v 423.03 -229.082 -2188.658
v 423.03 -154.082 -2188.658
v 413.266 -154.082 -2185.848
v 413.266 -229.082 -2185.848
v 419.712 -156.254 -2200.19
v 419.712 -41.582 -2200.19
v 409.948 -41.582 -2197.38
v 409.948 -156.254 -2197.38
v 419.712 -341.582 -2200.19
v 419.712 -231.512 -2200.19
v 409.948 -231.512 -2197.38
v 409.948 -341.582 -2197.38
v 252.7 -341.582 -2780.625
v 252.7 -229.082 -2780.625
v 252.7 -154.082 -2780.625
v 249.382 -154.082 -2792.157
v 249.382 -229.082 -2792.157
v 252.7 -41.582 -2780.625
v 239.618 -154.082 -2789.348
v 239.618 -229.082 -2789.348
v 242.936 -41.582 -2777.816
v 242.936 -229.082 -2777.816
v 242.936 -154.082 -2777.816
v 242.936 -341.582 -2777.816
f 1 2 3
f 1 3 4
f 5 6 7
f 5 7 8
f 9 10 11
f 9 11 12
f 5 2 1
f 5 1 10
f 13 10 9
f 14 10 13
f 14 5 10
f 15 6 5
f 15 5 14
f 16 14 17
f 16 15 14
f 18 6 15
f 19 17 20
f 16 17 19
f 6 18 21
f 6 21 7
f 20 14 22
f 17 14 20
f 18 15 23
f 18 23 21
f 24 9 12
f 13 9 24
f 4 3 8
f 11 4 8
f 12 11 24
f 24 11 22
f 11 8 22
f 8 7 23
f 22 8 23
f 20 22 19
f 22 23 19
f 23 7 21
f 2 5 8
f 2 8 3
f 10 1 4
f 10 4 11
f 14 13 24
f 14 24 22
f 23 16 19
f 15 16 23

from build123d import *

# Parameters (mm, degrees)
BOSS_EXTRUDE1_DEPTH = 10.16


with BuildPart() as part:
    # Sketch1 → Boss-Extrude1 (new body)
    with BuildSketch(Plane(origin=(972.287594707, 0, -279.761907089), x_dir=(-0.27651668570360943, 0, -0.9610091167764702), z_dir=(0.9610091167764702, 0, -0.27651668570360943))):
        Polygon((2602.330216376, -41.581628832), (1998.345068474, -41.581628832), (1998.345068474, -156.254177234), (1986.345068474, -154.081628832), (1986.345068474, -229.081628832), (1998.345068474, -231.512401326), (1998.345068474, -341.581628832), (2602.330216376, -341.581628832), (2602.330216376, -229.081628832), (2614.330216376, -229.081628832), (2614.330216376, -154.081628832), (2602.330216376, -154.081628832), align=None)
    extrude(amount=-BOSS_EXTRUDE1_DEPTH)


solid = part.part
